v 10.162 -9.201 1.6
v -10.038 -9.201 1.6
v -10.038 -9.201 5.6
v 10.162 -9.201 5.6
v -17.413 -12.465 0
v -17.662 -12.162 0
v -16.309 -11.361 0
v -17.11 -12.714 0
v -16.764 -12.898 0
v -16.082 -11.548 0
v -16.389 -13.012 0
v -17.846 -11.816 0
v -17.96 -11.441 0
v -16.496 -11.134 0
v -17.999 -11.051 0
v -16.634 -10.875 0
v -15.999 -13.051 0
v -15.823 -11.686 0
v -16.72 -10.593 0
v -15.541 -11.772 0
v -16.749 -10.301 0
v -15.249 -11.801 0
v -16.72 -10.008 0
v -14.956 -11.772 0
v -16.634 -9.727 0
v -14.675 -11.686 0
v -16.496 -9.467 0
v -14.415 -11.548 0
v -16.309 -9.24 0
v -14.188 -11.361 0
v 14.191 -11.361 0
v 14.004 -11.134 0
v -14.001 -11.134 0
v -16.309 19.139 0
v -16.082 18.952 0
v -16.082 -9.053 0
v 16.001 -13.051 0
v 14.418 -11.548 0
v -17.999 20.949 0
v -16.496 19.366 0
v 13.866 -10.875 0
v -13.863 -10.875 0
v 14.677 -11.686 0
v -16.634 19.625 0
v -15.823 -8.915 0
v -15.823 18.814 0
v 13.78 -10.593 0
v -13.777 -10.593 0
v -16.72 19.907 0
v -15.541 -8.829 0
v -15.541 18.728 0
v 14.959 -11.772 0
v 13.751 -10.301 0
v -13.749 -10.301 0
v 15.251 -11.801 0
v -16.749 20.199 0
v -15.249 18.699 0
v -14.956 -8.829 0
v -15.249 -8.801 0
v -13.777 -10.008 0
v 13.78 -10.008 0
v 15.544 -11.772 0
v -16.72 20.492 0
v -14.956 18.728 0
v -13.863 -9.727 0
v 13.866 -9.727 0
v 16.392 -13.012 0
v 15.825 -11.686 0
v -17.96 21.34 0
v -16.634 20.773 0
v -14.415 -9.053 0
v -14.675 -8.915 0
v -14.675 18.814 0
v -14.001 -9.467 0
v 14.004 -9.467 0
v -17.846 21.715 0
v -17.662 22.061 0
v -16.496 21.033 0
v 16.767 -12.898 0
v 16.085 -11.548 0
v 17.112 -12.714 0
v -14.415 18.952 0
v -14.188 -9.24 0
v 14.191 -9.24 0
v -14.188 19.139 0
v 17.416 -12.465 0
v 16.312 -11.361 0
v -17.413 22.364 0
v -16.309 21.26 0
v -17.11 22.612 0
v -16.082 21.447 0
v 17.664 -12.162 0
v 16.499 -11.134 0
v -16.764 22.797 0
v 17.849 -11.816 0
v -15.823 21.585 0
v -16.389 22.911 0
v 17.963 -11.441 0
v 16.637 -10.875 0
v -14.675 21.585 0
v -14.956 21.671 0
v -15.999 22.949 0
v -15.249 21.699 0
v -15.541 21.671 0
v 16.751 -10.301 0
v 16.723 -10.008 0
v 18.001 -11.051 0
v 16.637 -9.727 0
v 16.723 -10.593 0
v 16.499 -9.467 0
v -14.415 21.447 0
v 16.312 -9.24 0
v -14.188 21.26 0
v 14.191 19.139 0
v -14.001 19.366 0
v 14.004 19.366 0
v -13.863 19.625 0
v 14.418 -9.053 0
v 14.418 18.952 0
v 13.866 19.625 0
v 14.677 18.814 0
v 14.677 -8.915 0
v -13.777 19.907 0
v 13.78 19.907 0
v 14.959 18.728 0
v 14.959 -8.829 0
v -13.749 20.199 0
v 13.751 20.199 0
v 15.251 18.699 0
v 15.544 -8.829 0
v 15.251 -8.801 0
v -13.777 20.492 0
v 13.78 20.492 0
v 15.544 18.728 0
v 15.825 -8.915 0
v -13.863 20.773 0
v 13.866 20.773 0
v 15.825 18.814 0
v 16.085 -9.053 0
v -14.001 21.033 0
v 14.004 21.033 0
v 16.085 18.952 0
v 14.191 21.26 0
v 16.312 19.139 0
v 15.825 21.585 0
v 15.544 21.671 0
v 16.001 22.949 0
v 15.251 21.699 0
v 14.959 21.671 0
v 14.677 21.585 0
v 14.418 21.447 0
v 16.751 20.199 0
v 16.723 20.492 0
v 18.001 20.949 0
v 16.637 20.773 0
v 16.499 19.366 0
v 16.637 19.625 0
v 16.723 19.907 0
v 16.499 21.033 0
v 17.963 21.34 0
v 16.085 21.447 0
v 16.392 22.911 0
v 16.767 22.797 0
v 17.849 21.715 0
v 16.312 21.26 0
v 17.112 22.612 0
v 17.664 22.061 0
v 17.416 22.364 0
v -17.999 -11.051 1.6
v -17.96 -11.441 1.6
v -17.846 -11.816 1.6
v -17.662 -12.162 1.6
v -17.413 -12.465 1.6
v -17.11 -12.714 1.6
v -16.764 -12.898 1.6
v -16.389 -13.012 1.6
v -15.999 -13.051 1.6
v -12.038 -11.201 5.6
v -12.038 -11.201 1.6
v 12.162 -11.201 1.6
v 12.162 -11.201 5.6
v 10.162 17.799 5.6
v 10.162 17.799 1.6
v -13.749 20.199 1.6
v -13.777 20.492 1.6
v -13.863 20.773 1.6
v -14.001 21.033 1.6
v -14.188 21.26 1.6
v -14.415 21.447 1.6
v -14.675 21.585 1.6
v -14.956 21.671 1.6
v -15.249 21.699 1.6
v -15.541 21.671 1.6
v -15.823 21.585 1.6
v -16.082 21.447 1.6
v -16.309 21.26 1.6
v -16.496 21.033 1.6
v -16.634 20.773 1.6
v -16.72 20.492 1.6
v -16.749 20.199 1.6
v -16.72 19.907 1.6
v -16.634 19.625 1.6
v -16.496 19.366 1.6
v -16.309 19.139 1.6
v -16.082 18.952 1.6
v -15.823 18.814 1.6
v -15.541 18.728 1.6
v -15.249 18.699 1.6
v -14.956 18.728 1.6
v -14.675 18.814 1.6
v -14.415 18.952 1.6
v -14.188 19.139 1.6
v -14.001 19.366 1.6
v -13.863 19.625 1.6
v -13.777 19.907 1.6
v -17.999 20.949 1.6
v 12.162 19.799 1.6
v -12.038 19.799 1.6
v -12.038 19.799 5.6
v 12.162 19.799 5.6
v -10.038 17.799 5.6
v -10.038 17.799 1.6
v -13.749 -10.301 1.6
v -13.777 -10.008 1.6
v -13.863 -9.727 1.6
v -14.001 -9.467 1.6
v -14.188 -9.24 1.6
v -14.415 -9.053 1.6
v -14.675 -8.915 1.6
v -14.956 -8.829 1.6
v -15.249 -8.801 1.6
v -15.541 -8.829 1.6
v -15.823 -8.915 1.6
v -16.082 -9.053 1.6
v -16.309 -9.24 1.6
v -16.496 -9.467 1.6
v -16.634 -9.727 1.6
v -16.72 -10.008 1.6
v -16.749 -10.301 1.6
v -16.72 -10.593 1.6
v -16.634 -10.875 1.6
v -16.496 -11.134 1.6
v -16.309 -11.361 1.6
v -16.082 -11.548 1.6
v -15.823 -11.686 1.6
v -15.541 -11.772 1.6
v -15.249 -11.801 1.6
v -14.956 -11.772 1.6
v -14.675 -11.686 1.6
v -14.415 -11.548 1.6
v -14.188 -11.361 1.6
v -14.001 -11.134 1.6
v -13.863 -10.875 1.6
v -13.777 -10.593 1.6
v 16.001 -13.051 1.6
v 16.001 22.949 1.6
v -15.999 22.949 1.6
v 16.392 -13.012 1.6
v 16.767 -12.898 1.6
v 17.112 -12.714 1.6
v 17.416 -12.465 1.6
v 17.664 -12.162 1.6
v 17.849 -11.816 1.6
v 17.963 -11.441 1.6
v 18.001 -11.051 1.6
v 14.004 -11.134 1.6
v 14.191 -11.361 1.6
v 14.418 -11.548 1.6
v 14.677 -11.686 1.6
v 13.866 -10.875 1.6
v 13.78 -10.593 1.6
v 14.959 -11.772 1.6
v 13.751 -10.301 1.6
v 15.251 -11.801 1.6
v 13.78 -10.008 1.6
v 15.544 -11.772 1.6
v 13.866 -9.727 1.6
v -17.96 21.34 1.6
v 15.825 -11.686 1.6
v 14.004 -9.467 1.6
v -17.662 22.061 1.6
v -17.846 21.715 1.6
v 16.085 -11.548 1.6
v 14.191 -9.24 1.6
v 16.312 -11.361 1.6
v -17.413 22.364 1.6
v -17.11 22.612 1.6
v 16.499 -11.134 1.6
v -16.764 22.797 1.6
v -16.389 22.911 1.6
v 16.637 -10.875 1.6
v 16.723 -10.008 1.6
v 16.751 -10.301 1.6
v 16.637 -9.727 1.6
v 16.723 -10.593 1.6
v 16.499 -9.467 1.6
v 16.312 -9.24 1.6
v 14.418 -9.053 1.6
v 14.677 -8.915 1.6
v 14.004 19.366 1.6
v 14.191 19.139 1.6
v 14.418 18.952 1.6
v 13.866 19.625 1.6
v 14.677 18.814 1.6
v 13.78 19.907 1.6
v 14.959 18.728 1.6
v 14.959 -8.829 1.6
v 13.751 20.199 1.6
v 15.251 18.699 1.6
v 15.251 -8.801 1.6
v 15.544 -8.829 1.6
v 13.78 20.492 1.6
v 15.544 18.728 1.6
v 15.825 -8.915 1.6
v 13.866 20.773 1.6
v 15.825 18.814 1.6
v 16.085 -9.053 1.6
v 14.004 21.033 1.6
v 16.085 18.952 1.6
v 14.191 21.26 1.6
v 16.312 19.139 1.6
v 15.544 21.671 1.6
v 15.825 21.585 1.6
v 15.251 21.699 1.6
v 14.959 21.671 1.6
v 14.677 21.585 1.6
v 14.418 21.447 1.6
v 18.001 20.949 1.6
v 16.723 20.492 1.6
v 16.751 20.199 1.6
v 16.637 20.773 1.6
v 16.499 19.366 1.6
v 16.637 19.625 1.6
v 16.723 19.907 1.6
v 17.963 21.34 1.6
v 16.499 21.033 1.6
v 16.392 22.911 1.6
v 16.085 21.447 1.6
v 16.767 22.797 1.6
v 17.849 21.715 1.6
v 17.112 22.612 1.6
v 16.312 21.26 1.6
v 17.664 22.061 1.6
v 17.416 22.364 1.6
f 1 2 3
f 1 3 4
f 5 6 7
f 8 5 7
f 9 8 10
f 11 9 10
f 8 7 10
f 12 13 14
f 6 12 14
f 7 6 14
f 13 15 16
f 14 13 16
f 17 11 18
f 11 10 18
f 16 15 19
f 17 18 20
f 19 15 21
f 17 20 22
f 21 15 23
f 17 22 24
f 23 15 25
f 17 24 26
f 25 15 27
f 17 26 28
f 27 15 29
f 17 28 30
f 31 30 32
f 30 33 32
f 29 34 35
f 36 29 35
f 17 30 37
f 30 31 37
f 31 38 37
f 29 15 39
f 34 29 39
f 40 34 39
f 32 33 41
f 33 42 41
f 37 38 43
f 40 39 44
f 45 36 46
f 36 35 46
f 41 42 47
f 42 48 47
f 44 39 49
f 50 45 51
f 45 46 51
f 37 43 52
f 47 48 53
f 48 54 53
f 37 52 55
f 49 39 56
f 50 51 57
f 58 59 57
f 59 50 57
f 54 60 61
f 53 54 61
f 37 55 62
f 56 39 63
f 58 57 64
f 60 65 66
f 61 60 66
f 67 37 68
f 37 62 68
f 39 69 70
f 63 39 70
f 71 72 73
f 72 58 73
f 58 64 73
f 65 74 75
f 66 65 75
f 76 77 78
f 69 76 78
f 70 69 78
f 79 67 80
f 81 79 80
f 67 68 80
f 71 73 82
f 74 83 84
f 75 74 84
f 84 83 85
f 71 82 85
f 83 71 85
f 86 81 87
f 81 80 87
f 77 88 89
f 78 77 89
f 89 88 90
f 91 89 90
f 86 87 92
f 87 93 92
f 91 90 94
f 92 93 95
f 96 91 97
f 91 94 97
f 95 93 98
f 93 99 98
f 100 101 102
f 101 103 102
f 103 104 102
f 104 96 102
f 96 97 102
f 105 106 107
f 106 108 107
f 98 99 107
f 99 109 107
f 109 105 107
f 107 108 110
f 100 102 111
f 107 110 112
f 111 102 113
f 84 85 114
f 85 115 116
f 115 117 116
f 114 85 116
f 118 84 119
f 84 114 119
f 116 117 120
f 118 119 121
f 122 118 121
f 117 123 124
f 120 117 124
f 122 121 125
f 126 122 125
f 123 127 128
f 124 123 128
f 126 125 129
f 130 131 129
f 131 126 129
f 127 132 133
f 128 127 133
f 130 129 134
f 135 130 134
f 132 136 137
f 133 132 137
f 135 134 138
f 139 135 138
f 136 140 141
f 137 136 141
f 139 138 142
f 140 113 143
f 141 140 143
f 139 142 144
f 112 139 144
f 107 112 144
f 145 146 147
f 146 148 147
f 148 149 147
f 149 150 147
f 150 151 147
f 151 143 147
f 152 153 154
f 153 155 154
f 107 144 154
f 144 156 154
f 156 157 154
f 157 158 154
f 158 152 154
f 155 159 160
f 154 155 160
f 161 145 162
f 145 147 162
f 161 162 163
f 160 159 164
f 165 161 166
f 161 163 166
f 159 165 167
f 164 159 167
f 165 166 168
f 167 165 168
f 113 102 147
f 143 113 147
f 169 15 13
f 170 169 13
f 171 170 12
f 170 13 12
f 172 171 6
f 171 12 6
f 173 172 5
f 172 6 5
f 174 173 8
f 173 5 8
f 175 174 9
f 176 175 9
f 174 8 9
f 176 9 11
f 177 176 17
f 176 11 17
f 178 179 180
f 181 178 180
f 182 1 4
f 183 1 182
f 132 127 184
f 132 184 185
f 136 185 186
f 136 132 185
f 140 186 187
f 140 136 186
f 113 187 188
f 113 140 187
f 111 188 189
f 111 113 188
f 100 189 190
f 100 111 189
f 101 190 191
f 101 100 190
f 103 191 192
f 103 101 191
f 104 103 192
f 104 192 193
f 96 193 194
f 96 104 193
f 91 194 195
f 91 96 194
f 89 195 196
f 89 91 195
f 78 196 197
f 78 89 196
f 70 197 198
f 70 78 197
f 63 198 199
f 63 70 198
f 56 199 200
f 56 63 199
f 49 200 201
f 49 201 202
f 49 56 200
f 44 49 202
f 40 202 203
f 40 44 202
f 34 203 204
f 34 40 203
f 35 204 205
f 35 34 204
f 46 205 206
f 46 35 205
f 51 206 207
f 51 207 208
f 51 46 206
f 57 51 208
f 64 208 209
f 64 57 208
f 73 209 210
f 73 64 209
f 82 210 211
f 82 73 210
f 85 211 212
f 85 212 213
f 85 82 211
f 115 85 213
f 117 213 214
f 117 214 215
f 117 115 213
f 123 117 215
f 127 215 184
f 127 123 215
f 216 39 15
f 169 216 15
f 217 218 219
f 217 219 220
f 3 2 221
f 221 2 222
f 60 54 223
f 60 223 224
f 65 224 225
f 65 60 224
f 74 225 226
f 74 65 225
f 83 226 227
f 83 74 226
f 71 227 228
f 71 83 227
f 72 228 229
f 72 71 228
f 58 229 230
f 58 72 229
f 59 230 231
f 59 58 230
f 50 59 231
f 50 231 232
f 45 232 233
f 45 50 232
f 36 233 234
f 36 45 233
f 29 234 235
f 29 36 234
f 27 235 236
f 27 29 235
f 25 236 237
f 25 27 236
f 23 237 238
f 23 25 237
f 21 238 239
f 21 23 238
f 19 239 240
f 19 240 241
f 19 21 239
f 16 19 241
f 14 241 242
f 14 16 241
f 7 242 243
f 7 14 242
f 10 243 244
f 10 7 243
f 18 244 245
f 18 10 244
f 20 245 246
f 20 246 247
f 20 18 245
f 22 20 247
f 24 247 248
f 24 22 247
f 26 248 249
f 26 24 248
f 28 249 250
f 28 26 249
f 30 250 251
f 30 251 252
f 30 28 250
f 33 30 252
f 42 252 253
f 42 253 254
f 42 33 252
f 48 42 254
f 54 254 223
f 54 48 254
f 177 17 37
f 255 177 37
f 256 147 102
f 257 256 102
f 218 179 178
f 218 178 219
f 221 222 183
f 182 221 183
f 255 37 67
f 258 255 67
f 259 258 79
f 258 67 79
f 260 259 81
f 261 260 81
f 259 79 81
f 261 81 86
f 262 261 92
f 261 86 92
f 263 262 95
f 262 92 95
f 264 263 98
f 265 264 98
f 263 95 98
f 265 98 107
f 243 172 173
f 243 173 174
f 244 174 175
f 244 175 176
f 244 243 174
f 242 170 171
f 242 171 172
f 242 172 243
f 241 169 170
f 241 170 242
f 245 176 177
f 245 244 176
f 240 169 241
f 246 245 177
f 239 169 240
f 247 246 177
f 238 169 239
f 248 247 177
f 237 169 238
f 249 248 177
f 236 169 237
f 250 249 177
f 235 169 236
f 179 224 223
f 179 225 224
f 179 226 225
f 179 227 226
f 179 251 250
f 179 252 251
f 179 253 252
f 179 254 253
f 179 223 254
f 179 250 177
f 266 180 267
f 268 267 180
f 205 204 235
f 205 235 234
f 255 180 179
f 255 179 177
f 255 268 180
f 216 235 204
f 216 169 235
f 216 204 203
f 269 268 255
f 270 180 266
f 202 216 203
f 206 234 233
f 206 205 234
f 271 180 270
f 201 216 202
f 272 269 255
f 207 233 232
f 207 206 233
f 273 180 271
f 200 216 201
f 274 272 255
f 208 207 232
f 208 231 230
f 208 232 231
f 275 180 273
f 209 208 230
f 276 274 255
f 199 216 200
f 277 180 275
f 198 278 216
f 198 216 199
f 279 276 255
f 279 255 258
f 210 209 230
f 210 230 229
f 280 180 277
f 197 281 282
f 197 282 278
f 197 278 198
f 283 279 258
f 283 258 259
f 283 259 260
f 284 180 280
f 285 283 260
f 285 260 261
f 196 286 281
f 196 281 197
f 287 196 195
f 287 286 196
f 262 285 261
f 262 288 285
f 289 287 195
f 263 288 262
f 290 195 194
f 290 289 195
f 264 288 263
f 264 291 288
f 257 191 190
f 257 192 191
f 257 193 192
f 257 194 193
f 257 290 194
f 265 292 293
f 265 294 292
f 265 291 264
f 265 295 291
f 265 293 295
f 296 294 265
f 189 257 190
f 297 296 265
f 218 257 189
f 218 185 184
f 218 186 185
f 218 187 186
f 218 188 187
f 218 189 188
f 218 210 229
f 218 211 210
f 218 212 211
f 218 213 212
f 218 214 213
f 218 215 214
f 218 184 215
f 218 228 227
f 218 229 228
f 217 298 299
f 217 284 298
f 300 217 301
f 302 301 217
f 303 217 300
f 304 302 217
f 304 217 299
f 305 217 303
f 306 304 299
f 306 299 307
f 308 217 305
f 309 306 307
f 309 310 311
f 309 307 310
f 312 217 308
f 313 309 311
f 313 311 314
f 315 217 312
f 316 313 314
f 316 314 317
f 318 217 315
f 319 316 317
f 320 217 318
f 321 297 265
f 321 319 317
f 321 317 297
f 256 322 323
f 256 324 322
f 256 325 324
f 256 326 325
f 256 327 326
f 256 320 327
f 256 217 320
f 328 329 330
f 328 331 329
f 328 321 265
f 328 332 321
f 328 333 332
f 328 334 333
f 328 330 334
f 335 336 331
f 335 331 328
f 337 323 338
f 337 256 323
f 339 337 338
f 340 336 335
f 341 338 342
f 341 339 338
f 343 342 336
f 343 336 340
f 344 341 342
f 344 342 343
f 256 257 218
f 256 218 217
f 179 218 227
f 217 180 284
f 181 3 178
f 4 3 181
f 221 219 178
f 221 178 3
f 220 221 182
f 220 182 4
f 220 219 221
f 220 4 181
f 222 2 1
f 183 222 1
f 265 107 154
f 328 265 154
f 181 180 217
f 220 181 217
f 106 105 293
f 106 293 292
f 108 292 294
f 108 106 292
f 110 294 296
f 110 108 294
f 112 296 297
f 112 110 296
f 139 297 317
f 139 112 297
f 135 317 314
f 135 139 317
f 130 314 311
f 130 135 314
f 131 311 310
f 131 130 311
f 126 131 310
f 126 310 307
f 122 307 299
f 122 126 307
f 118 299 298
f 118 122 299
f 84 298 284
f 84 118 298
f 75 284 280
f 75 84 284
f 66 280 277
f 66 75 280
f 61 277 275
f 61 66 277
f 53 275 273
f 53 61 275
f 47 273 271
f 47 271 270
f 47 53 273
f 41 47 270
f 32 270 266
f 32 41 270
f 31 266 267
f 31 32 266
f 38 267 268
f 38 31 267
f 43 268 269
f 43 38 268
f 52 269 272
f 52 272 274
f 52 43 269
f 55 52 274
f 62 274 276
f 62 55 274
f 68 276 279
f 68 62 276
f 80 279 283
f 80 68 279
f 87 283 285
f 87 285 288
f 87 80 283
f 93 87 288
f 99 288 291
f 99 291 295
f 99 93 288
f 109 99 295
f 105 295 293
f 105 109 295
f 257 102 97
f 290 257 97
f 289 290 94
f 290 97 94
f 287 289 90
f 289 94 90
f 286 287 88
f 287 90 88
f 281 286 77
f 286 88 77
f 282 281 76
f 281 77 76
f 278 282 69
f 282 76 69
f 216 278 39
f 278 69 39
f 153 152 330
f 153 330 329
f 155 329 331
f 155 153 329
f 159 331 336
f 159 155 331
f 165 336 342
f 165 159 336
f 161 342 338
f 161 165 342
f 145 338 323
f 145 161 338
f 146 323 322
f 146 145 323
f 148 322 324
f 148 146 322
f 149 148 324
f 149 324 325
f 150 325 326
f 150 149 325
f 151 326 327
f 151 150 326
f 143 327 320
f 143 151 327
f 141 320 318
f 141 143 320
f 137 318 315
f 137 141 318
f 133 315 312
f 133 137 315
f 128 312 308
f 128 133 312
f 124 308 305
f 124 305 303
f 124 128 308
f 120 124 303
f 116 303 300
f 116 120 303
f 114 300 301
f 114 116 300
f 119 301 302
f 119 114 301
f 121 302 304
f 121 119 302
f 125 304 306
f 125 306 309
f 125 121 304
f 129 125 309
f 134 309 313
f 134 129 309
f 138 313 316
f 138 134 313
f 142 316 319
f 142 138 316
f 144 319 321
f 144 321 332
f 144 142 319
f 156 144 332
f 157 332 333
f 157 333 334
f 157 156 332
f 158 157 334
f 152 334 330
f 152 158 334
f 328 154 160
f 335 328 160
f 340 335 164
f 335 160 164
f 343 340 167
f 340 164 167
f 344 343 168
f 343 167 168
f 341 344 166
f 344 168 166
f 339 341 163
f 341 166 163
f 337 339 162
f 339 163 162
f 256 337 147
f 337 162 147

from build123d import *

# Parameters (mm, degrees)
F0_R     = 1.5
F1_DEPTH = 1.6
F2_W     = 24.2
F2_H     = 31
F2_W_2   = 20.2
F2_H_2   = 27
F3_DEPTH = 4


with BuildPart() as f1:
    # F0 (on Top) → F1 (new body)
    with BuildSketch(Plane.XY):
        with BuildLine():
            ThreePointArc((-15.998648, 22.949437), (-17.412861, 22.36365), (-17.998648, 20.949437))
            Line((-17.998648, 20.949437), (-17.998648, -11.050563))
            ThreePointArc((-17.998648, -11.050563), (-17.412861, -12.464777), (-15.998648, -13.050563))
            Line((-15.998648, -13.050563), (16.001352, -13.050563))
            ThreePointArc((16.001352, -13.050563), (17.415566, -12.464777), (18.001352, -11.050563))
            Line((18.001352, -11.050563), (18.001352, 20.949437))
            ThreePointArc((18.001352, 20.949437), (17.415566, 22.36365), (16.001352, 22.949437))
            Line((16.001352, 22.949437), (-15.998648, 22.949437))
        make_face()
        with Locations((-15.248648, -10.300563)):
            Circle(F0_R, mode=Mode.SUBTRACT)
        with Locations((15.251352, -10.300563)):
            Circle(F0_R, mode=Mode.SUBTRACT)
        with Locations((-15.248648, 20.199437)):
            Circle(F0_R, mode=Mode.SUBTRACT)
        with Locations((15.251352, 20.199437)):
            Circle(F0_R, mode=Mode.SUBTRACT)
    extrude(amount=F1_DEPTH)

    # F2 (on face) → F3 (join)
    with BuildSketch(Plane.XY.offset(1.6)):
        with Locations((0.061713, 4.298806)):
            Rectangle(F2_W, F2_H)
        with Locations((0.061713, 4.298806)):
            Rectangle(F2_W_2, F2_H_2, mode=Mode.SUBTRACT)
    extrude(amount=F3_DEPTH)


solid = f1.part
